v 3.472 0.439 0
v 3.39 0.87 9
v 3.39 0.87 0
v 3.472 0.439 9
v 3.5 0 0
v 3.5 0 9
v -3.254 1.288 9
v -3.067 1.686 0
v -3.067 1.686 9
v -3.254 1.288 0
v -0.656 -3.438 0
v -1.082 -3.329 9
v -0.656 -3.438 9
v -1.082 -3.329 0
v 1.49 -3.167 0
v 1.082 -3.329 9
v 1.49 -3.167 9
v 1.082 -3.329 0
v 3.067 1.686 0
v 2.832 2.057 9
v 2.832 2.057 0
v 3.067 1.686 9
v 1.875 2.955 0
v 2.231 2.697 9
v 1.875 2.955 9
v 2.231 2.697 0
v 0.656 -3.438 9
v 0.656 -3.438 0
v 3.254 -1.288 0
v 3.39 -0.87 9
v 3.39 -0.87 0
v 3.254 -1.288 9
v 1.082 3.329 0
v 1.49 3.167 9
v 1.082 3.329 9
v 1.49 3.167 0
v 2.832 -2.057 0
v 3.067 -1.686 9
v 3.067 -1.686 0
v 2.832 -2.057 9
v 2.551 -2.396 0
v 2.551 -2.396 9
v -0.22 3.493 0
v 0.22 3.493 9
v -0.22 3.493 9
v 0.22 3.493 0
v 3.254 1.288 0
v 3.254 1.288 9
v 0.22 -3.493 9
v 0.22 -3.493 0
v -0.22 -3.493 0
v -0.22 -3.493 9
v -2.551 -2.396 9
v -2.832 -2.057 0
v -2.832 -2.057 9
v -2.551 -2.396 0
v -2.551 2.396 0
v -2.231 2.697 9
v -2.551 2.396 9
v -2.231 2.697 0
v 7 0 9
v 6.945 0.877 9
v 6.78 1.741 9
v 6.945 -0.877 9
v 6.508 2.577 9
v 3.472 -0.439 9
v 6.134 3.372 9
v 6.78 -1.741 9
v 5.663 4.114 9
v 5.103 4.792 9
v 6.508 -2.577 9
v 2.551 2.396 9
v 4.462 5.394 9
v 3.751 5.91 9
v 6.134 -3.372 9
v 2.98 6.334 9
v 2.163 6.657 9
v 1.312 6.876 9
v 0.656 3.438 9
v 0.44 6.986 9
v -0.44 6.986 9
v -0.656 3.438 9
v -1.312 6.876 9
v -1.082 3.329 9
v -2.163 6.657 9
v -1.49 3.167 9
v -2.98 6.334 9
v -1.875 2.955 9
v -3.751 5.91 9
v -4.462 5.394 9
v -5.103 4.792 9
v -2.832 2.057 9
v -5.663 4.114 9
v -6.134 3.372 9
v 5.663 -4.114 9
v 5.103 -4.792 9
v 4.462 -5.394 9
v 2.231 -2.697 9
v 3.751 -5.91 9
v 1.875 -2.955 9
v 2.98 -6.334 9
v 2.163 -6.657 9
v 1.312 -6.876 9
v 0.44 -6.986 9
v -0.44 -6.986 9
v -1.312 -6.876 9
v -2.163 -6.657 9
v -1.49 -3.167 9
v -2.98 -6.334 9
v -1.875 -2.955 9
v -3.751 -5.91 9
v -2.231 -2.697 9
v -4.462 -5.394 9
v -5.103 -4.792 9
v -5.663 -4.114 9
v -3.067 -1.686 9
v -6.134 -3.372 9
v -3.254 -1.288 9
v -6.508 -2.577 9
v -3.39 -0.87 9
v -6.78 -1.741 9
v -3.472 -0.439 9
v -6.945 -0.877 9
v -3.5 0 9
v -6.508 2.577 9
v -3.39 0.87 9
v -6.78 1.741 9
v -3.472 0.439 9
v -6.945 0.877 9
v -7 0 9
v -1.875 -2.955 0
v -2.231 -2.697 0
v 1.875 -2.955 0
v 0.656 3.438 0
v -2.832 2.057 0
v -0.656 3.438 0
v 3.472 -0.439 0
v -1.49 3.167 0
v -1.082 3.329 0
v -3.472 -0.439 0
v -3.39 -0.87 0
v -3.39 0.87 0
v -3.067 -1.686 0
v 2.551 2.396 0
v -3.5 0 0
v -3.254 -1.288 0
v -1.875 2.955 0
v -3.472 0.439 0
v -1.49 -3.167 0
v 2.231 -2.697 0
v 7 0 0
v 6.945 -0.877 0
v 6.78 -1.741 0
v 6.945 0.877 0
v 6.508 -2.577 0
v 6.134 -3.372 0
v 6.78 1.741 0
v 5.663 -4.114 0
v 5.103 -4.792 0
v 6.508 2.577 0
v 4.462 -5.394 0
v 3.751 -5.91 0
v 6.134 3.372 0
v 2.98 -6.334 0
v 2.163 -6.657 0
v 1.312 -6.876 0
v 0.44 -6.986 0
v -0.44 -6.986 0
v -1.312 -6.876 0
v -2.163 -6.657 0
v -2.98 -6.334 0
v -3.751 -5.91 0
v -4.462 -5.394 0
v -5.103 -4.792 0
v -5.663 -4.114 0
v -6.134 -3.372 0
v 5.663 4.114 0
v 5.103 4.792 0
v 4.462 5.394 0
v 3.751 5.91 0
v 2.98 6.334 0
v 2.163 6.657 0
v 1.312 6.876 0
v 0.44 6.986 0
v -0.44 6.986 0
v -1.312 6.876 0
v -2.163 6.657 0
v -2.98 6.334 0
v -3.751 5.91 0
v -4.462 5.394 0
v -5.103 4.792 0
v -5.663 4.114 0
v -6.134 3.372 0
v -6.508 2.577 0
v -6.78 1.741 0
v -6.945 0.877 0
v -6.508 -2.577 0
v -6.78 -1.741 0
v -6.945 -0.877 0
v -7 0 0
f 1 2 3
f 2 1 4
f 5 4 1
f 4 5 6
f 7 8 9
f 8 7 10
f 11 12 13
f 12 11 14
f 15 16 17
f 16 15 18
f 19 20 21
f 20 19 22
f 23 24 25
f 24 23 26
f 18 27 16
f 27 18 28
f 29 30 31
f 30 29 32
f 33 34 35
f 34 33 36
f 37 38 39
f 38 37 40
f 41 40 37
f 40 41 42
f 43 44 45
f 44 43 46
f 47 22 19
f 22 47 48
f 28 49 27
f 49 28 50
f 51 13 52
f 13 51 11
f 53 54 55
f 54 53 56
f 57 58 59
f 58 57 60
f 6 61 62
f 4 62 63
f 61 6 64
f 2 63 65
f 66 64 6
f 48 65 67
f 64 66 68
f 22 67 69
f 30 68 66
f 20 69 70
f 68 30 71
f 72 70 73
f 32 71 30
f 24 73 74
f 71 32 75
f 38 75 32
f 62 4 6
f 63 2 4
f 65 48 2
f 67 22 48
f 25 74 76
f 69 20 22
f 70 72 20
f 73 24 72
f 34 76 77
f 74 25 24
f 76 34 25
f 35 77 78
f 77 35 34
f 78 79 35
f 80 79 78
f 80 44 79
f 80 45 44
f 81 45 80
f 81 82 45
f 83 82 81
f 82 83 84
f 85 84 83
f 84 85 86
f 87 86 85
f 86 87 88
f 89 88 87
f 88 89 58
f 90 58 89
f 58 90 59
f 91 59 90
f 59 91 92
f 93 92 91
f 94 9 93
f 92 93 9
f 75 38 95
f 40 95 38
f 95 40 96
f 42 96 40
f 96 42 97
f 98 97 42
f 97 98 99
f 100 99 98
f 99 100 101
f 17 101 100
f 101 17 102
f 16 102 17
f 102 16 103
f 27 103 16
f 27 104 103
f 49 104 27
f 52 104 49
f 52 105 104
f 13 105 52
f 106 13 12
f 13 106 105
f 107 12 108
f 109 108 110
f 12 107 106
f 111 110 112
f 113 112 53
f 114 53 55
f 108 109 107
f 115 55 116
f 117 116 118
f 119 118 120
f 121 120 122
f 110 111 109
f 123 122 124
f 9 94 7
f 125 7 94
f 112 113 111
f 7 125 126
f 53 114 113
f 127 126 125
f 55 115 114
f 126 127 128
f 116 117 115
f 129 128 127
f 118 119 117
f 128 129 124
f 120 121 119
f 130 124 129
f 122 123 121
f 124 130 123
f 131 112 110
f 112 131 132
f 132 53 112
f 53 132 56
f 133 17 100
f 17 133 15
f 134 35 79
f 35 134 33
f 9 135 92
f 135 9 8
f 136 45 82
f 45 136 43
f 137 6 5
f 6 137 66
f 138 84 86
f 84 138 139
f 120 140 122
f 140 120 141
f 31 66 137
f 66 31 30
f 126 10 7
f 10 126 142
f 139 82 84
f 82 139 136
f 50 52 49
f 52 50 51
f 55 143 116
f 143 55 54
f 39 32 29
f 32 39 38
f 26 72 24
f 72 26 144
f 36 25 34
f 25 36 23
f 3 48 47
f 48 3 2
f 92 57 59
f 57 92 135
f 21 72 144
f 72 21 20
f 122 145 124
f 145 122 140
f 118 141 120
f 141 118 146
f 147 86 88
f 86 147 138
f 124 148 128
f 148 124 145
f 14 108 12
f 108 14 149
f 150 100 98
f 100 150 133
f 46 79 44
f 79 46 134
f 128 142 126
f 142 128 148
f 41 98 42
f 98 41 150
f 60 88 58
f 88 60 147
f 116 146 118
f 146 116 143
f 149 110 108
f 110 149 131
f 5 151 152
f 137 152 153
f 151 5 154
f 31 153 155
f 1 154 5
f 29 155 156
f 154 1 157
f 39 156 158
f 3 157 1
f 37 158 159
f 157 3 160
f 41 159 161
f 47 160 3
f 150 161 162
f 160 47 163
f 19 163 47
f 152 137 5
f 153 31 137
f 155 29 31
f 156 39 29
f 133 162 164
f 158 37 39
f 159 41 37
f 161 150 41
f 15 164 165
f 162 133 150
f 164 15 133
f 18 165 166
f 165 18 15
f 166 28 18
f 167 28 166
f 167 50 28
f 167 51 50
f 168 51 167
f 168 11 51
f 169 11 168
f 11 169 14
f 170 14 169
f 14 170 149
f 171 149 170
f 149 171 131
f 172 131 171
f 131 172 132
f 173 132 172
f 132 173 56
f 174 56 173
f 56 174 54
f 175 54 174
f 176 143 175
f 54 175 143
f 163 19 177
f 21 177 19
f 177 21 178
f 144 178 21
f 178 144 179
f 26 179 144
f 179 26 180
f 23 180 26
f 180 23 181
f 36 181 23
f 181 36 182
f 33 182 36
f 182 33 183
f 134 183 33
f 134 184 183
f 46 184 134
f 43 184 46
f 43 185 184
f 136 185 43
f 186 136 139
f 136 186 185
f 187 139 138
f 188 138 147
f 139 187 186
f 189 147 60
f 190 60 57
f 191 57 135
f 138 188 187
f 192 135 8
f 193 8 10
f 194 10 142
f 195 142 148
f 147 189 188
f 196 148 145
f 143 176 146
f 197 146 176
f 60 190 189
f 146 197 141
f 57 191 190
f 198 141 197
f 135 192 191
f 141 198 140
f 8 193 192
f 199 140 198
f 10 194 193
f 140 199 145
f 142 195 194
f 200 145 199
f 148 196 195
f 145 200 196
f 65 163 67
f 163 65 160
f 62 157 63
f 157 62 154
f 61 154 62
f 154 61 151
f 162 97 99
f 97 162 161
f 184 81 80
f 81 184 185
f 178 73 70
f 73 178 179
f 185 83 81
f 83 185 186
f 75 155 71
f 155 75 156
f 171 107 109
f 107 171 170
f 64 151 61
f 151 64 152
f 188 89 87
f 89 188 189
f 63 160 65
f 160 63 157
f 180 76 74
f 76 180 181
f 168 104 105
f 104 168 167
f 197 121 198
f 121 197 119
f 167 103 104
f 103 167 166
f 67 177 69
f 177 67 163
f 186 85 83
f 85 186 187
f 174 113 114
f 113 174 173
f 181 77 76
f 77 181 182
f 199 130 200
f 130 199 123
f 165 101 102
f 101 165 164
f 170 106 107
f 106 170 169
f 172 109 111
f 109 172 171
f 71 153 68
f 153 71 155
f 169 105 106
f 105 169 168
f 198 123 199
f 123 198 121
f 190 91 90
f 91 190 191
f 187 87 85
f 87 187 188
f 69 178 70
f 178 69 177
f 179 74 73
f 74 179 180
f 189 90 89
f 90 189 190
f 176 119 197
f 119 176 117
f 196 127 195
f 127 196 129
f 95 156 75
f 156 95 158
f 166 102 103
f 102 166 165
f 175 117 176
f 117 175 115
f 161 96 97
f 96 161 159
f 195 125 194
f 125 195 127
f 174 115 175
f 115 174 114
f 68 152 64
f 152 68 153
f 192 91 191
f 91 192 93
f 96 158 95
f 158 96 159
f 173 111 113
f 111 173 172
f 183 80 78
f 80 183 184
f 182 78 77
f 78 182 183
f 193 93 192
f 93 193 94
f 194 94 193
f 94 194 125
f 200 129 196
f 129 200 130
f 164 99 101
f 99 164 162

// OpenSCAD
$fn = 50;


difference() {
	union() {
		cylinder(h = 9, r = 7.0000000000);
	}
	union() {
		#translate(v = [0.0000000000, 0.0000000000, -100.0000000000]) {
			cylinder(h = 200, r = 3.2500000000);
		}
		#translate(v = [0.0000000000, 0.0000000000, -100.0000000000]) {
			cylinder(h = 200, r = 3.2500000000);
		}
		#translate(v = [0.0000000000, 0.0000000000, -100.0000000000]) {
			cylinder(h = 200, r = 3.2500000000);
		}
		#translate(v = [0.0000000000, 0.0000000000, -100.0000000000]) {
			cylinder(h = 200, r = 3.2500000000);
		}
		#cylinder(h = 9, r = 3.5000000000);
	}
}
